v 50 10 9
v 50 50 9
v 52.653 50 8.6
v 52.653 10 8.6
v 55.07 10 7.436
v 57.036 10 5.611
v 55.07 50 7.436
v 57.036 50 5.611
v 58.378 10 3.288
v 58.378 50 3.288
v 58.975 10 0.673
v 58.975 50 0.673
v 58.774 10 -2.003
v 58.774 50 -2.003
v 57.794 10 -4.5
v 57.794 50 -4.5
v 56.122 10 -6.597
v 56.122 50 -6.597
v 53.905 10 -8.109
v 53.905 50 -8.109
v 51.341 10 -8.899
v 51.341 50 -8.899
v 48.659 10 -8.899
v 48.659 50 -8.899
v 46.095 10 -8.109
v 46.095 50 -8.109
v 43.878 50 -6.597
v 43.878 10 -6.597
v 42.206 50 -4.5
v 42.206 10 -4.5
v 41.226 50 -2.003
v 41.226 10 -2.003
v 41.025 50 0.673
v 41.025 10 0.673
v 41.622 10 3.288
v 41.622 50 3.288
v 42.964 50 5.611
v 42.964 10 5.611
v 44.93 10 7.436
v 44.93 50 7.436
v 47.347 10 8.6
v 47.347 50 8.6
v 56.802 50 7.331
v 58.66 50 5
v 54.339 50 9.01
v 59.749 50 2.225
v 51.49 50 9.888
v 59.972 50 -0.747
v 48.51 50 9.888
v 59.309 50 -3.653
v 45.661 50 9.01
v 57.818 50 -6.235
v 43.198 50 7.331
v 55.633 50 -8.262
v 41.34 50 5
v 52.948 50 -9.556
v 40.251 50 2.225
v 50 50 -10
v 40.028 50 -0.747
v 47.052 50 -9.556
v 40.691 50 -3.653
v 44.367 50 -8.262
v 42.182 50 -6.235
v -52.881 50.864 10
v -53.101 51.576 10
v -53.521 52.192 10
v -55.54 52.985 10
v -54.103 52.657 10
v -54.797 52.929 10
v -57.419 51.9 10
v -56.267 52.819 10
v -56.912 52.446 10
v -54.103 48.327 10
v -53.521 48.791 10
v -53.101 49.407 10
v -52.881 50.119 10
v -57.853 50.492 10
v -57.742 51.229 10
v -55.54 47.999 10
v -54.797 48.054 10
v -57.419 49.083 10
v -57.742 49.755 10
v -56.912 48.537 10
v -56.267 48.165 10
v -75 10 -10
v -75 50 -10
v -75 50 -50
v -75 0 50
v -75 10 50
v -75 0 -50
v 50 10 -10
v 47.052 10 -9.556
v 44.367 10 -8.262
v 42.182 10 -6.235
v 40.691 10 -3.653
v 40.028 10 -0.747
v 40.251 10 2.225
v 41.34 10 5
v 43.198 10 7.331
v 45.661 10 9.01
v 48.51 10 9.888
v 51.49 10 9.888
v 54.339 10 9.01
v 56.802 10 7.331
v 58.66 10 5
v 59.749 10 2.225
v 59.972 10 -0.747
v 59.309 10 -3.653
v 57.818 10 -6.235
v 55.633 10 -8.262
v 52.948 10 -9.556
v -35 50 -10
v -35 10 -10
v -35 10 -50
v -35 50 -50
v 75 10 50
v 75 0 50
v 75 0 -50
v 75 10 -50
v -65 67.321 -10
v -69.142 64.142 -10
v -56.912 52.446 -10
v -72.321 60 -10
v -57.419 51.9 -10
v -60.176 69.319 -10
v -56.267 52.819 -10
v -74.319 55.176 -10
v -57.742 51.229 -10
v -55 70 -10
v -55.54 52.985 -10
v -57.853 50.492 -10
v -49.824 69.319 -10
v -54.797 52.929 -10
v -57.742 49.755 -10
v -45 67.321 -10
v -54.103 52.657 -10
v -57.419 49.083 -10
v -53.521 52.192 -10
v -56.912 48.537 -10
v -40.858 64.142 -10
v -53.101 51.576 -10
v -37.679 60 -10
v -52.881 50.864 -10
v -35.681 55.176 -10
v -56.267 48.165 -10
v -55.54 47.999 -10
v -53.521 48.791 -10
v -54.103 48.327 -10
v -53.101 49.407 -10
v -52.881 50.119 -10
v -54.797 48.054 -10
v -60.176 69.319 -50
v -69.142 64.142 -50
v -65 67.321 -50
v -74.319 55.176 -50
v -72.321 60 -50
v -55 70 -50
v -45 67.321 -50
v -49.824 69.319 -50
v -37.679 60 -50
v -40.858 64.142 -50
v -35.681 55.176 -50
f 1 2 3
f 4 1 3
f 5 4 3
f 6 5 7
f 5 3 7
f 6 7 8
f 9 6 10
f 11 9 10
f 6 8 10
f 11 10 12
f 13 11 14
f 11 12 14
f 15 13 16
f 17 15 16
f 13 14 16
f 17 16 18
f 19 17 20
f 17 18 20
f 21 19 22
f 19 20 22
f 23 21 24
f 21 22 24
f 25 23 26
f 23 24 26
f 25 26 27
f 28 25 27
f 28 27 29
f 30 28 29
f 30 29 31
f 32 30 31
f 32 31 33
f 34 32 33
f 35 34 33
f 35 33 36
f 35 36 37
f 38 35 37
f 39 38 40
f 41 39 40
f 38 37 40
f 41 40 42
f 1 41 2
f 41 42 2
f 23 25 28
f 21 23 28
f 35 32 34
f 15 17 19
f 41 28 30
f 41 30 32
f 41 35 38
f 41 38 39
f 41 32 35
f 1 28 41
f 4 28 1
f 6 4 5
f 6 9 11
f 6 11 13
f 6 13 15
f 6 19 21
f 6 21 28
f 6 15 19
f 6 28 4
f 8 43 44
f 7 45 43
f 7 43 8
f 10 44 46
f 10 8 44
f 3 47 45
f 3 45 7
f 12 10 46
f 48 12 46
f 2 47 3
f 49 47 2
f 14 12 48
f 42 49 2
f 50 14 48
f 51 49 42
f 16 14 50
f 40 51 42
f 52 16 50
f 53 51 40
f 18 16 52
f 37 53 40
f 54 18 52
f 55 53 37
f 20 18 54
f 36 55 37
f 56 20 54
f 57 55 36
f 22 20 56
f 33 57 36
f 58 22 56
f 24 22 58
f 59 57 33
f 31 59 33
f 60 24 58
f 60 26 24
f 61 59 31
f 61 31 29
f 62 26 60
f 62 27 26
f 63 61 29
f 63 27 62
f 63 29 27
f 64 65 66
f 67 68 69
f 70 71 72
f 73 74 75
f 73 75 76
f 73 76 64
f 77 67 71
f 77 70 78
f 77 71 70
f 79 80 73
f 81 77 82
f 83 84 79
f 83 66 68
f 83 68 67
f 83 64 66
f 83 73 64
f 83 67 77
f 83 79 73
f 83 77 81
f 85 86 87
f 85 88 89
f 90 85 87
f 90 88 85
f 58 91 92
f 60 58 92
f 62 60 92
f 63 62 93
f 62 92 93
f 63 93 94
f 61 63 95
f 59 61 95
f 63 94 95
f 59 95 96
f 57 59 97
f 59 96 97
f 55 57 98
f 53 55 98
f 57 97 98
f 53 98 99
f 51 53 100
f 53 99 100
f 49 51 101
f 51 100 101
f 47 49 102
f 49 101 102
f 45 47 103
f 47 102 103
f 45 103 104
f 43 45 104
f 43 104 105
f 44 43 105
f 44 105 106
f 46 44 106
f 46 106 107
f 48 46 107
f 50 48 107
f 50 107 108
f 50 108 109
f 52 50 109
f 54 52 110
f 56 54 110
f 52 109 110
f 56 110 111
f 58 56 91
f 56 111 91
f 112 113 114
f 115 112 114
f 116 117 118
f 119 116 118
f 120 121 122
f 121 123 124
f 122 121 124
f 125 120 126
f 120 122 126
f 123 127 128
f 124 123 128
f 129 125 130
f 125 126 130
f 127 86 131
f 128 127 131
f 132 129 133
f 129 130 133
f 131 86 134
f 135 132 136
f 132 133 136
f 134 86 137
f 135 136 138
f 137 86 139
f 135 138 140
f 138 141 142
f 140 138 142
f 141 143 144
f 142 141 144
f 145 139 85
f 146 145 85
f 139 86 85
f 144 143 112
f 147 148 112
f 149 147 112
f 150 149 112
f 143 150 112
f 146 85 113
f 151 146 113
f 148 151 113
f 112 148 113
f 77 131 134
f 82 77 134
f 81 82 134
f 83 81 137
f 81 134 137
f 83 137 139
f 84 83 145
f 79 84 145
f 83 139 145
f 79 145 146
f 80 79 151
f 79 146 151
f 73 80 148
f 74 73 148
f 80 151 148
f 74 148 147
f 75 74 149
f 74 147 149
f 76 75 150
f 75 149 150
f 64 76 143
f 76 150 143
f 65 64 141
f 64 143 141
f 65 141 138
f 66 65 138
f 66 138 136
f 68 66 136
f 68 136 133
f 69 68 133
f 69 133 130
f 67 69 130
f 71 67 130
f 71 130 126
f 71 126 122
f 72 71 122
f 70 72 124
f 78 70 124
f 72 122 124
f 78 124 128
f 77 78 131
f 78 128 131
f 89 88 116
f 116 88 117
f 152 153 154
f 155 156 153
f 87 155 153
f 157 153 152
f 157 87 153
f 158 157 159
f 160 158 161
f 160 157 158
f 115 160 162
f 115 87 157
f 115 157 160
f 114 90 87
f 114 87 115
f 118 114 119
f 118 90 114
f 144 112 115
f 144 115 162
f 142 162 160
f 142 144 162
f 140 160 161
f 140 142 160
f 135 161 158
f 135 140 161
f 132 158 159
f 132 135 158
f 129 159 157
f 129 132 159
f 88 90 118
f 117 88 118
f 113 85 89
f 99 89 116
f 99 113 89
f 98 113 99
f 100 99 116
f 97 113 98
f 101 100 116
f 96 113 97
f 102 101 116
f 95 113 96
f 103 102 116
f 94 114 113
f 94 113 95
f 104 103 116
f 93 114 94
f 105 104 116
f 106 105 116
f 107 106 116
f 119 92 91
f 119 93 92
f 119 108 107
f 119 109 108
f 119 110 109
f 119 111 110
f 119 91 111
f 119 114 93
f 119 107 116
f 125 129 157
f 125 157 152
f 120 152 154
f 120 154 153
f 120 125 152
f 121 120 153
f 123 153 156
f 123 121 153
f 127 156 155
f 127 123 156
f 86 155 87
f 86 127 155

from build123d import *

# Parameters (mm, degrees)
SKETCH1_W           = 150
SKETCH1_H           = 100
BOSS_EXTRUDE1_DEPTH = 10
SKETCH2_R           = 10
BOSS_EXTRUDE2_DEPTH = 40
SKETCH3_R           = 9
CUT_EXTRUDE2_DEPTH  = 40
SKETCH4_W           = 40
SKETCH4_H           = 40
BOSS_EXTRUDE3_DEPTH = 60
CUT_EXTRUDE3_DEPTH  = 50
CUT_EXTRUDE4_DEPTH  = 50
SKETCH8_R           = 2.5
BOSS_EXTRUDE5_DEPTH = 20


with BuildPart() as part:
    # Sketch1 → Boss-Extrude1 (new body)
    with BuildSketch(Plane(origin=(0, 0, 0), x_dir=(1, 0, 0), z_dir=(0, 1, 0))):
        Rectangle(SKETCH1_W, SKETCH1_H)
    extrude(amount=BOSS_EXTRUDE1_DEPTH)

    # Sketch2 → Boss-Extrude2 (add)
    with BuildSketch(Plane(origin=(0, 10, 0), x_dir=(1, 0, 0), z_dir=(0, 1, 0))):
        with Locations(Location((50, 0, 0), (0, 0, 90))):
            Circle(SKETCH2_R)
    extrude(amount=BOSS_EXTRUDE2_DEPTH)

    # Sketch3 → Cut-Extrude2 (cut)
    with BuildSketch(Plane(origin=(0, 50, 0), x_dir=(1, 0, 0), z_dir=(0, 1, 0))):
        with Locations(Location((50, 0, 0), (0, 0, 270))):
            Circle(SKETCH3_R)
    extrude(amount=-CUT_EXTRUDE2_DEPTH, mode=Mode.SUBTRACT)

    # Sketch4 → Boss-Extrude3 (add)
    with BuildSketch(Plane(origin=(0, 10, 0), x_dir=(1, 0, 0), z_dir=(0, 1, 0))):
        with Locations((-55, 30)):
            Rectangle(SKETCH4_W, SKETCH4_H)
    extrude(amount=BOSS_EXTRUDE3_DEPTH)

    # Sketch6 → Cut-Extrude3 (cut)
    with BuildSketch(Plane.XY.offset(-10)):
        with BuildLine():
            Line((-75, 50), (-75, 70))
            Line((-75, 70), (-55, 70))
            ThreePointArc((-55, 70), (-69.142135624, 64.142135624), (-75, 50))
        make_face()
    extrude(amount=-CUT_EXTRUDE3_DEPTH, mode=Mode.SUBTRACT)

    # Sketch7 → Cut-Extrude4 (cut)
    with BuildSketch(Plane.XY.offset(-10)):
        with BuildLine():
            Line((-55, 70), (-35, 70))
            Line((-35, 70), (-35, 50))
            ThreePointArc((-35, 50), (-40.857864376, 64.142135624), (-55, 70))
        make_face()
    extrude(amount=-CUT_EXTRUDE4_DEPTH, mode=Mode.SUBTRACT)

    # Sketch8 → Boss-Extrude5 (add)
    with BuildSketch(Plane.XY.offset(-10)):
        with Locations(Location((-55.353289102, 50.491778343, 0), (0, 0, 180))):
            Circle(SKETCH8_R)
    extrude(amount=BOSS_EXTRUDE5_DEPTH)


solid = part.part
